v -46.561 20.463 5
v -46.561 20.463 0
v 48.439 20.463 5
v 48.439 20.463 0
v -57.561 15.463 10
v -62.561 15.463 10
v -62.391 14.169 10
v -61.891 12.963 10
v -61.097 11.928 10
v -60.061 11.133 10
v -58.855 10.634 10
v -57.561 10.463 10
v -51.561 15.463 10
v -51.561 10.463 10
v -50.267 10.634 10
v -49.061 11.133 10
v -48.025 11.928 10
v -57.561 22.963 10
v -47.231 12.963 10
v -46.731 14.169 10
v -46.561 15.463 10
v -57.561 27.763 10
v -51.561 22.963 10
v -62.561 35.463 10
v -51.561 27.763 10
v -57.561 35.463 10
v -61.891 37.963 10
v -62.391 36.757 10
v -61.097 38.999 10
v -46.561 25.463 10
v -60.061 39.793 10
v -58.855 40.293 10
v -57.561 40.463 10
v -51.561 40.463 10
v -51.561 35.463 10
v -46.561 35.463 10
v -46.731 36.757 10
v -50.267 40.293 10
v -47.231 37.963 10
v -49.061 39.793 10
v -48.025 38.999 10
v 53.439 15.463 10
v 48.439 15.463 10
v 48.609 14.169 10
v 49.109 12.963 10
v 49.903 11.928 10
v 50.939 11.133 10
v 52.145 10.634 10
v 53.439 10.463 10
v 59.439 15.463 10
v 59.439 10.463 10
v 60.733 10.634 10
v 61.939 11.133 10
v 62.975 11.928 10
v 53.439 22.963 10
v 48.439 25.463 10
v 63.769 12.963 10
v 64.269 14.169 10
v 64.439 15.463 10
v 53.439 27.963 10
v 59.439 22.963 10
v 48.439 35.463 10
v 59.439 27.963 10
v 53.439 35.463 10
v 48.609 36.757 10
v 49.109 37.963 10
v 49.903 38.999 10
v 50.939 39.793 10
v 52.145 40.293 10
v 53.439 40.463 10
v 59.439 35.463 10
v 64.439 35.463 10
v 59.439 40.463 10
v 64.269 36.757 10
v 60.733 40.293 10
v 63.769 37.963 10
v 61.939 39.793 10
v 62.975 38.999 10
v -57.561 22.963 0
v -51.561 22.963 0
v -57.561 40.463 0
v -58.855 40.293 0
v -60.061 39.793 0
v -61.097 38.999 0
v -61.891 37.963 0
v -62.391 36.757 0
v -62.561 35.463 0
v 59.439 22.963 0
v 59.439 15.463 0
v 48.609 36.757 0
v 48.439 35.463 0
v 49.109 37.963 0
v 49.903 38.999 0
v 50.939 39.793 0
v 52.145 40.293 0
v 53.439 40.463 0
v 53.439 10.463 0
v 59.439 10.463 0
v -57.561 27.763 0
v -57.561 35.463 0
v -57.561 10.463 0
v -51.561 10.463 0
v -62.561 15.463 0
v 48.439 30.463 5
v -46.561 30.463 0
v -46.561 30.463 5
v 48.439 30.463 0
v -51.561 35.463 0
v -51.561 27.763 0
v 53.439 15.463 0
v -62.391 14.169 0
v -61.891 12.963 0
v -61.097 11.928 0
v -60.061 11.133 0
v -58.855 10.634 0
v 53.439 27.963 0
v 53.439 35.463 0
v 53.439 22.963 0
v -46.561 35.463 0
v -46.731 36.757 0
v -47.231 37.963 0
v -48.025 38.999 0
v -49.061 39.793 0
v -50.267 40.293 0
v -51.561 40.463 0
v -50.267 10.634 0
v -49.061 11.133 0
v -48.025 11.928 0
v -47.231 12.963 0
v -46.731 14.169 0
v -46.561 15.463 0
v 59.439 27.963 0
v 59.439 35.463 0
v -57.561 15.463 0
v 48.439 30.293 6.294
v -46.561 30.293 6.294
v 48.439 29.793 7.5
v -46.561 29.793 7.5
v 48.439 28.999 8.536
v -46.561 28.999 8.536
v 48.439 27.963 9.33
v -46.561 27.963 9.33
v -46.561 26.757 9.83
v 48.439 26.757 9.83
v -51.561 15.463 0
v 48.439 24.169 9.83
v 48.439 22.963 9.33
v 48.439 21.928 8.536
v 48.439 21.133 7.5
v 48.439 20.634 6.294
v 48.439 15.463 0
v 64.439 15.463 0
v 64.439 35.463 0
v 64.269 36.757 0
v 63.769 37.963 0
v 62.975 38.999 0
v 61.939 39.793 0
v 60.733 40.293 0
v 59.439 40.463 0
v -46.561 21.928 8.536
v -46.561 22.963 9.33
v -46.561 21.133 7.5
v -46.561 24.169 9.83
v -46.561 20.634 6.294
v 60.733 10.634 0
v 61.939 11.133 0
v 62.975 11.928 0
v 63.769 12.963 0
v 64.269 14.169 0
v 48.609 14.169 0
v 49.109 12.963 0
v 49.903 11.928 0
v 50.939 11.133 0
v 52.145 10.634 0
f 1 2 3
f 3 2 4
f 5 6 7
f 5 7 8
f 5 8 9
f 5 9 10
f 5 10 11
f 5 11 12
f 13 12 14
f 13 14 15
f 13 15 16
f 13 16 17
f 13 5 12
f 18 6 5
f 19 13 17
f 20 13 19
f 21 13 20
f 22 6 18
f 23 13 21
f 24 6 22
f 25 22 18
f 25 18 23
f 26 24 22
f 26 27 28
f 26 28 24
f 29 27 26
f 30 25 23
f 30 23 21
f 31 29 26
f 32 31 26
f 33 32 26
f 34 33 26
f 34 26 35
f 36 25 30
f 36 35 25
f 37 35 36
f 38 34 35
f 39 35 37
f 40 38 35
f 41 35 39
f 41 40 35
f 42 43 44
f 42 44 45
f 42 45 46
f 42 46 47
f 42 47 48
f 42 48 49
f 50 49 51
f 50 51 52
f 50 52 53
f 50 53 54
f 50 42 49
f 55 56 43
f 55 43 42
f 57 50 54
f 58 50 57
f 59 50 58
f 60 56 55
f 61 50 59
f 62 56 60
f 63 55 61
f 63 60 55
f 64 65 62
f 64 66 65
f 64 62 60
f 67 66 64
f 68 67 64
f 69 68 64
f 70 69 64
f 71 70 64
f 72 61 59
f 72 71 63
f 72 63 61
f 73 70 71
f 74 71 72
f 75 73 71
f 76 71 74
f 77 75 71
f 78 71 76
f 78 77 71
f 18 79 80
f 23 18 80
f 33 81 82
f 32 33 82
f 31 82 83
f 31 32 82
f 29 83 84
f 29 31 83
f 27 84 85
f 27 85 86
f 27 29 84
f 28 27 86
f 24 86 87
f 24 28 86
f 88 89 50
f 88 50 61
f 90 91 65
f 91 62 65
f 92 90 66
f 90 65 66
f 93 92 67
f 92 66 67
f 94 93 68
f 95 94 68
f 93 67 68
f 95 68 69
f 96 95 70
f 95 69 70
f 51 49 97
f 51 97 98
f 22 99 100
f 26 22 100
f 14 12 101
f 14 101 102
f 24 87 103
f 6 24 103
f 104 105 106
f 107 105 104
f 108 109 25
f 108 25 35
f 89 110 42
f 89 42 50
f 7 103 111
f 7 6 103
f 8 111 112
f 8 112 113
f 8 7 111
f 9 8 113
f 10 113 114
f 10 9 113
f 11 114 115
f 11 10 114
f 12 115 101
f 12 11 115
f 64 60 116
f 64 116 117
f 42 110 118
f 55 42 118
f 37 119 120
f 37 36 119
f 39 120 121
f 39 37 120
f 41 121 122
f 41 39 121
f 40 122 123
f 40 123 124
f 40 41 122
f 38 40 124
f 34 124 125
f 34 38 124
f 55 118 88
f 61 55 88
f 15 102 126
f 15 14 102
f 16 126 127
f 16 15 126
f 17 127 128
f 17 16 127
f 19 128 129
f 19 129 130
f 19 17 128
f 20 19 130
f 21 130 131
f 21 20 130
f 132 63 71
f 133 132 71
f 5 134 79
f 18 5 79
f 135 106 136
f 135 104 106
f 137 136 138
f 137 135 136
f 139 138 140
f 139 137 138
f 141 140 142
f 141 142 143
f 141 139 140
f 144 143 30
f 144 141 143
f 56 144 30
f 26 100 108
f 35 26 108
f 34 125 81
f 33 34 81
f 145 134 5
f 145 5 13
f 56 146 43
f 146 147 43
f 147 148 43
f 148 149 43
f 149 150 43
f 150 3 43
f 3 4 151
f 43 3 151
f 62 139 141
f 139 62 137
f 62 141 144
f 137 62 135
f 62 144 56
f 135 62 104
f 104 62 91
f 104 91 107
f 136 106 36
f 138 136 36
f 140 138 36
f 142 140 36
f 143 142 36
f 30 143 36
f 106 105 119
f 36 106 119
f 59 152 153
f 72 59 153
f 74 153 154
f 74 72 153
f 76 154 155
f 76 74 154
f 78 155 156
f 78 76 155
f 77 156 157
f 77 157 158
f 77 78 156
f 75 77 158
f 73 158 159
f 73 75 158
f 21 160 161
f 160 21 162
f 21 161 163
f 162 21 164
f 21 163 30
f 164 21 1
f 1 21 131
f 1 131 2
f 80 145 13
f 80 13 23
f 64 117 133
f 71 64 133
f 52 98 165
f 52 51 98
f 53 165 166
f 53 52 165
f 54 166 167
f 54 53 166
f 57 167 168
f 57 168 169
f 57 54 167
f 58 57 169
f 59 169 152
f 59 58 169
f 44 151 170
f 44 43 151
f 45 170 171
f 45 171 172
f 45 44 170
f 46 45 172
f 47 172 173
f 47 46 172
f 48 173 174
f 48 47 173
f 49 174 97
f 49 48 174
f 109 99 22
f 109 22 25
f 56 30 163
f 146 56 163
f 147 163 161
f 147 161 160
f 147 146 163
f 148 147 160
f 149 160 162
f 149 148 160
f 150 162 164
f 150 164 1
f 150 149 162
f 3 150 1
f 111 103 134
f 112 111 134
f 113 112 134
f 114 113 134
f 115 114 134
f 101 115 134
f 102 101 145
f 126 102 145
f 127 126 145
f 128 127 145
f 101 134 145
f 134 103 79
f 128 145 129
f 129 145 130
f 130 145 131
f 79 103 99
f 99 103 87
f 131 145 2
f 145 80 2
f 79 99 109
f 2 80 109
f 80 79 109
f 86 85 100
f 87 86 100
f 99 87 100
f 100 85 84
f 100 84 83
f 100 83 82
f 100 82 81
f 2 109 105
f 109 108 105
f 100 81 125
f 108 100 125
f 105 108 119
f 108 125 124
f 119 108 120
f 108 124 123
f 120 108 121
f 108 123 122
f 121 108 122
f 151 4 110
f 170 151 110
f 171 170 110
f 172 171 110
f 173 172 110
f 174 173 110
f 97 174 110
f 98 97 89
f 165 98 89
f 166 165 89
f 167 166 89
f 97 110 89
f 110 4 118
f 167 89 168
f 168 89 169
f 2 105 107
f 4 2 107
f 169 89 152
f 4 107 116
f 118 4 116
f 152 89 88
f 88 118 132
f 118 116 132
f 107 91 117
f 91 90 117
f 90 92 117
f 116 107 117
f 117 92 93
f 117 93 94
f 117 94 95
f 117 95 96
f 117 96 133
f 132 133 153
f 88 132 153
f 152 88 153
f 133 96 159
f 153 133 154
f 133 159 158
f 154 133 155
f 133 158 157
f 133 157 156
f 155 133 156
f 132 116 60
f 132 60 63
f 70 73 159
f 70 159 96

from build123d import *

# Parameters (mm, degrees)
F0_W     = 6
F0_H     = 7.5
F0_H_2   = 7.7
F1_DEPTH = 10
F0_W_2   = 95
F0_H_3   = 10
F2_DEPTH = 10
F3_R     = 4.99999
F4_R     = 5


# Not quite as in the source:
# - a fillet or chamfer is up to 0.001 mm smaller than in the source, because OpenCascade refuses the exact size


with BuildPart() as f1:
    # F0 (on Top) → F1 (new body)
    with BuildSketch(Plane.XY):
        Polygon((-46.5609904528, 20.46333462), (-46.5609904528, 30.46333462), (-46.5609904528, 40.46333462), (-62.5609904528, 40.46333462), (-62.5609904528, 10.46333462), (-46.5609904528, 10.46333462), align=None)
        with Locations((-54.5609904528, 19.21333462)):
            Rectangle(F0_W, F0_H, mode=Mode.SUBTRACT)
        with Locations((-54.5609904528, 31.61333462)):
            Rectangle(F0_W, F0_H_2, mode=Mode.SUBTRACT)
    extrude(amount=F1_DEPTH)



with BuildPart() as f1b:
    # F0 (on Top) → F1, piece 2 (new body)
    with BuildSketch(Plane.XY):
        Polygon((48.4390095472, 40.46333462), (48.4390095472, 30.46333462), (48.4390095472, 20.46333462), (48.4390095472, 10.46333462), (64.4390095472, 10.46333462), (64.4390095472, 40.46333462), align=None)
        with Locations((56.4390095472, 19.21333462)):
            Rectangle(F0_W, F0_H, mode=Mode.SUBTRACT)
        with Locations((56.4390095472, 31.71333462)):
            Rectangle(F0_W, F0_H, mode=Mode.SUBTRACT)
    extrude(amount=F1_DEPTH)


with BuildPart() as f1_1:
    add(f1.part)

    add(f1b.part)  # F2 merges F1b
    # F0 (on Top) → F2 (join)
    with BuildSketch(Plane.XY):
        with Locations((0.9390095472, 25.46333462)):
            Rectangle(F0_W_2, F0_H_3)
    extrude(amount=F2_DEPTH)

    # F3 (radius 5 in the source; OpenCascade refuses exactly that, so slightly less here)
    f3_edges = [f1_1.edges().sort_by_distance(p)[0] for p in [
        (0.93901, 20.463335, 10),
        (0.93901, 30.463335, 10),
    ]]
    fillet(f3_edges, radius=F3_R)

    # F4
    f4_edges = [f1_1.edges().sort_by_distance(p)[0] for p in [
        (-62.56099, 10.463335, 5),
        (-46.56099, 10.463335, 5),
        (48.43901, 10.463335, 5),
        (64.43901, 10.463335, 5),
        (64.43901, 40.463335, 5),
        (48.43901, 40.463335, 5),
        (-46.56099, 40.463335, 5),
        (-62.56099, 40.463335, 5),
    ]]
    fillet(f4_edges, radius=F4_R)


solid = f1_1.part
